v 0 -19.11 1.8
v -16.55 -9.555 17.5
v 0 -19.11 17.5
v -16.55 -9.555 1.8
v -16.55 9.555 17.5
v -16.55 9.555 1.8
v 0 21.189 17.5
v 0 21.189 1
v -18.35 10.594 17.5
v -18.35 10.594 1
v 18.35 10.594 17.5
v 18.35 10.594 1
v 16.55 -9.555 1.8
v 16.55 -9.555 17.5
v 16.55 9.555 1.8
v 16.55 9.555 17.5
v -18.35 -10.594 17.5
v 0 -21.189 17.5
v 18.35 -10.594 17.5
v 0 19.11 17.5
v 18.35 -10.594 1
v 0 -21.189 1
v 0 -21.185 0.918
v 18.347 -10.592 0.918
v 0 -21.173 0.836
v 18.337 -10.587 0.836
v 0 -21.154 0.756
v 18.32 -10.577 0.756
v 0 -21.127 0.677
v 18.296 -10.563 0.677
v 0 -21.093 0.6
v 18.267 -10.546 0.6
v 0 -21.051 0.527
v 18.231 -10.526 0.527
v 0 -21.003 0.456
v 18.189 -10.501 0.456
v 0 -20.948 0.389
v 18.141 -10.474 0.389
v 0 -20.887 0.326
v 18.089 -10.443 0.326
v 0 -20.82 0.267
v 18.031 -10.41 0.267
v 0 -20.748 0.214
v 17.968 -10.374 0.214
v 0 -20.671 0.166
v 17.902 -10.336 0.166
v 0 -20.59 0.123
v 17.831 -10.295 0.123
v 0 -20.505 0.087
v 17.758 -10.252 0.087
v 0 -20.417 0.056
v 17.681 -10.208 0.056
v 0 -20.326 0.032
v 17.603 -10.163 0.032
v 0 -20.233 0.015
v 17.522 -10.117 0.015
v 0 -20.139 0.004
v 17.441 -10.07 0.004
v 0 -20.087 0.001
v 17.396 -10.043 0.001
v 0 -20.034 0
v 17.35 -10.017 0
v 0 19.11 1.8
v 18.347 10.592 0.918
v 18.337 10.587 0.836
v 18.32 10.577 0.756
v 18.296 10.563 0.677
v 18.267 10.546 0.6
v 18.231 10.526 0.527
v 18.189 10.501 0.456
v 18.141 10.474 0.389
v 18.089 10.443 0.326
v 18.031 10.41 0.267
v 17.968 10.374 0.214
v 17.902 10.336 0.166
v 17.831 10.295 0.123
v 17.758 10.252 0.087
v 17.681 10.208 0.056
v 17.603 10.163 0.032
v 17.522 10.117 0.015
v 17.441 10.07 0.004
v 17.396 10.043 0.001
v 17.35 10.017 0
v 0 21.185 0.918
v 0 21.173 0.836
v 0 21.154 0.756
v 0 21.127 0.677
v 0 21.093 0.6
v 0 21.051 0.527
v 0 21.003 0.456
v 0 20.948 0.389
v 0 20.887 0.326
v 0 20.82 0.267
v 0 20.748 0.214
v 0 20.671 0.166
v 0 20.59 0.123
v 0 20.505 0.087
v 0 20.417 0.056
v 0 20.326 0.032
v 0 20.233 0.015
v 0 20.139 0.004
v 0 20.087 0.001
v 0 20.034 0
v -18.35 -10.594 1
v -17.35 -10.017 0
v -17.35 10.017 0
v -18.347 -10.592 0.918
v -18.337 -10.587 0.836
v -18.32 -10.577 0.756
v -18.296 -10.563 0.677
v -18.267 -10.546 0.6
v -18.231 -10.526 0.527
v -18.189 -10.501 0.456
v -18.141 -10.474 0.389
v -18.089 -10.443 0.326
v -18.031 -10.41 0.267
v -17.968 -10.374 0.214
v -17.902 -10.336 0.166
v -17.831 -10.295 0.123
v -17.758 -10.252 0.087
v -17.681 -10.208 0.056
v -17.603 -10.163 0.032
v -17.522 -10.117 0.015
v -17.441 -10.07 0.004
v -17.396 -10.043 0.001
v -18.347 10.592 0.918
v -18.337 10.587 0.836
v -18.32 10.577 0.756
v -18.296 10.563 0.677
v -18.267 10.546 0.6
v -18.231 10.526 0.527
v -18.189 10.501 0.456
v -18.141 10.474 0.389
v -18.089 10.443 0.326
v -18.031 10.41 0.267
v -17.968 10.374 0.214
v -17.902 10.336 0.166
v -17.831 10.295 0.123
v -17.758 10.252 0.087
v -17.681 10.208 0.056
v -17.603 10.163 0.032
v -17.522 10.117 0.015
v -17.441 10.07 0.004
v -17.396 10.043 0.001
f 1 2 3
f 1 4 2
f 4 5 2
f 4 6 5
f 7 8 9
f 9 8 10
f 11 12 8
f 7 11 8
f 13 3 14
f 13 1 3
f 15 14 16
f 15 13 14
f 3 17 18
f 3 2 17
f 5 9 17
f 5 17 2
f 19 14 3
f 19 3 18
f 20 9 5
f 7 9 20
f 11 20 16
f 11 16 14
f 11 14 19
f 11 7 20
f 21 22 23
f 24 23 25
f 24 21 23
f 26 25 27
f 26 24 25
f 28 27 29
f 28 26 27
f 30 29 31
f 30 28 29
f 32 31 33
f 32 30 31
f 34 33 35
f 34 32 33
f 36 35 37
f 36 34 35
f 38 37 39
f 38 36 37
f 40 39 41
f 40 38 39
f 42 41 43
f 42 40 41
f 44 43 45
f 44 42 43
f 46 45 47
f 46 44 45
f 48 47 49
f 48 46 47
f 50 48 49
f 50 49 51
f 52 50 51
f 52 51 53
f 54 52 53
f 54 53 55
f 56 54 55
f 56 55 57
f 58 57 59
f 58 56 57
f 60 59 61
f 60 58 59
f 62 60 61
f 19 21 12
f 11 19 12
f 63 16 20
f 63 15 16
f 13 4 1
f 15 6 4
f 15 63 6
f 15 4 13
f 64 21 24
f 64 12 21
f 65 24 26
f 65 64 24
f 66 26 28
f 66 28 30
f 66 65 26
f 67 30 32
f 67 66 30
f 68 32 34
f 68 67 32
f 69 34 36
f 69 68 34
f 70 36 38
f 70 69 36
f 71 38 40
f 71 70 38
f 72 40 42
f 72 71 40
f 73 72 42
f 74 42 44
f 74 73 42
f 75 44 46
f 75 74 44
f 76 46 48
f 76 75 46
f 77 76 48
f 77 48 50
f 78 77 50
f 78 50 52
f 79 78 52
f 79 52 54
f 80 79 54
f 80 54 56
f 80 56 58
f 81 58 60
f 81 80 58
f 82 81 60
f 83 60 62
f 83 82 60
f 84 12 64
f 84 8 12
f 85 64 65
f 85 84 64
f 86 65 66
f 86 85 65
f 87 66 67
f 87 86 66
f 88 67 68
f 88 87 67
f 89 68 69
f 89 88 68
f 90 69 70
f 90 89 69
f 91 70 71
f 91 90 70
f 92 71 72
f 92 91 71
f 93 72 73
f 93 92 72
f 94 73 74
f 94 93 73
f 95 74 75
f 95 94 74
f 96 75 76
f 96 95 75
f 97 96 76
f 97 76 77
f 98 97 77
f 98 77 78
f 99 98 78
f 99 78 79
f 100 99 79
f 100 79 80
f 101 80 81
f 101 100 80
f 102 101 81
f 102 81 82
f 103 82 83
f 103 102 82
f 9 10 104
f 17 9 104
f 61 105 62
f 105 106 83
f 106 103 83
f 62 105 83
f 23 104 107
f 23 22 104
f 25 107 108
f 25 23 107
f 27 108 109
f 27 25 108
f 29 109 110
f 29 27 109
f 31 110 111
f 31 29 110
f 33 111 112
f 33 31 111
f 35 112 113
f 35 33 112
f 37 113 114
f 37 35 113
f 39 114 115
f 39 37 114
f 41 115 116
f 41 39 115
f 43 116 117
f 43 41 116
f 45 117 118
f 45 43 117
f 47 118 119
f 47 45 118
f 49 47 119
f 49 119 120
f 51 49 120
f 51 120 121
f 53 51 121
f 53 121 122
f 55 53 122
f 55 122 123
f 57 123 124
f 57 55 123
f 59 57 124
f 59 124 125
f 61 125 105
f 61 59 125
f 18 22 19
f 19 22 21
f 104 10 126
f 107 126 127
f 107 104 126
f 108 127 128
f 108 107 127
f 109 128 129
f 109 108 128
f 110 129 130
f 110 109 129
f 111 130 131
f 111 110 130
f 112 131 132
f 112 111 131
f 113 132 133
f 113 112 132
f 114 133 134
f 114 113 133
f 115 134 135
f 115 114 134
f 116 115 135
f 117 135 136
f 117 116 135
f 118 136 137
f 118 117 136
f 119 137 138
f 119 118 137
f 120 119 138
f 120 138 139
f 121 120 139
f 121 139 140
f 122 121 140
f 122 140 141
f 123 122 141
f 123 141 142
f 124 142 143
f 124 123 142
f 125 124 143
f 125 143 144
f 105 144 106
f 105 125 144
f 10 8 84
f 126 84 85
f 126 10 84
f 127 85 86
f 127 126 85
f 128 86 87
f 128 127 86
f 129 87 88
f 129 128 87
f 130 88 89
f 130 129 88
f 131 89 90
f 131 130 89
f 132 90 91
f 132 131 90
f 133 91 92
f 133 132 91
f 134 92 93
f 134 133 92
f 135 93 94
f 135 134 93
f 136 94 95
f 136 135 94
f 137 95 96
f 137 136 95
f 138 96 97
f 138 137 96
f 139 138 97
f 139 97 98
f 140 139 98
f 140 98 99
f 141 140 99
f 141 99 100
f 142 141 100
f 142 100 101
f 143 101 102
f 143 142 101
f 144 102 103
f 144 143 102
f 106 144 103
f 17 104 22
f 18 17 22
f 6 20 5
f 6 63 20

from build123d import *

# Parameters (mm, degrees)
F1_DEPTH = 17.5
F2_T     = -1.8
F3_R     = 1


with BuildPart() as f1:
    # F0 (on Top) → F1 (new body)
    with BuildSketch(Plane.XY):
        Polygon((-18.35, 10.594377), (-18.35, -10.594377), (0, -21.188755), (18.35, -10.594377), (18.35, 10.594377), (0, 21.188755), align=None)
    extrude(amount=F1_DEPTH)

    # F2
    f2_openings = [f1.faces().sort_by_distance(p)[0] for p in [
        (0, 0, 17.5),
    ]]
    offset(amount=F2_T, openings=f2_openings)

    # F3
    f3_edges = [f1.edges().sort_by_distance(p)[0] for p in [
        (-18.35, 0, 0),
        (-9.175, -15.891566, 0),
        (9.175, -15.891566, 0),
        (18.35, 0, 0),
        (9.175, 15.891566, 0),
        (-9.175, 15.891566, 0),
    ]]
    fillet(f3_edges, radius=F3_R)


solid = f1.part
